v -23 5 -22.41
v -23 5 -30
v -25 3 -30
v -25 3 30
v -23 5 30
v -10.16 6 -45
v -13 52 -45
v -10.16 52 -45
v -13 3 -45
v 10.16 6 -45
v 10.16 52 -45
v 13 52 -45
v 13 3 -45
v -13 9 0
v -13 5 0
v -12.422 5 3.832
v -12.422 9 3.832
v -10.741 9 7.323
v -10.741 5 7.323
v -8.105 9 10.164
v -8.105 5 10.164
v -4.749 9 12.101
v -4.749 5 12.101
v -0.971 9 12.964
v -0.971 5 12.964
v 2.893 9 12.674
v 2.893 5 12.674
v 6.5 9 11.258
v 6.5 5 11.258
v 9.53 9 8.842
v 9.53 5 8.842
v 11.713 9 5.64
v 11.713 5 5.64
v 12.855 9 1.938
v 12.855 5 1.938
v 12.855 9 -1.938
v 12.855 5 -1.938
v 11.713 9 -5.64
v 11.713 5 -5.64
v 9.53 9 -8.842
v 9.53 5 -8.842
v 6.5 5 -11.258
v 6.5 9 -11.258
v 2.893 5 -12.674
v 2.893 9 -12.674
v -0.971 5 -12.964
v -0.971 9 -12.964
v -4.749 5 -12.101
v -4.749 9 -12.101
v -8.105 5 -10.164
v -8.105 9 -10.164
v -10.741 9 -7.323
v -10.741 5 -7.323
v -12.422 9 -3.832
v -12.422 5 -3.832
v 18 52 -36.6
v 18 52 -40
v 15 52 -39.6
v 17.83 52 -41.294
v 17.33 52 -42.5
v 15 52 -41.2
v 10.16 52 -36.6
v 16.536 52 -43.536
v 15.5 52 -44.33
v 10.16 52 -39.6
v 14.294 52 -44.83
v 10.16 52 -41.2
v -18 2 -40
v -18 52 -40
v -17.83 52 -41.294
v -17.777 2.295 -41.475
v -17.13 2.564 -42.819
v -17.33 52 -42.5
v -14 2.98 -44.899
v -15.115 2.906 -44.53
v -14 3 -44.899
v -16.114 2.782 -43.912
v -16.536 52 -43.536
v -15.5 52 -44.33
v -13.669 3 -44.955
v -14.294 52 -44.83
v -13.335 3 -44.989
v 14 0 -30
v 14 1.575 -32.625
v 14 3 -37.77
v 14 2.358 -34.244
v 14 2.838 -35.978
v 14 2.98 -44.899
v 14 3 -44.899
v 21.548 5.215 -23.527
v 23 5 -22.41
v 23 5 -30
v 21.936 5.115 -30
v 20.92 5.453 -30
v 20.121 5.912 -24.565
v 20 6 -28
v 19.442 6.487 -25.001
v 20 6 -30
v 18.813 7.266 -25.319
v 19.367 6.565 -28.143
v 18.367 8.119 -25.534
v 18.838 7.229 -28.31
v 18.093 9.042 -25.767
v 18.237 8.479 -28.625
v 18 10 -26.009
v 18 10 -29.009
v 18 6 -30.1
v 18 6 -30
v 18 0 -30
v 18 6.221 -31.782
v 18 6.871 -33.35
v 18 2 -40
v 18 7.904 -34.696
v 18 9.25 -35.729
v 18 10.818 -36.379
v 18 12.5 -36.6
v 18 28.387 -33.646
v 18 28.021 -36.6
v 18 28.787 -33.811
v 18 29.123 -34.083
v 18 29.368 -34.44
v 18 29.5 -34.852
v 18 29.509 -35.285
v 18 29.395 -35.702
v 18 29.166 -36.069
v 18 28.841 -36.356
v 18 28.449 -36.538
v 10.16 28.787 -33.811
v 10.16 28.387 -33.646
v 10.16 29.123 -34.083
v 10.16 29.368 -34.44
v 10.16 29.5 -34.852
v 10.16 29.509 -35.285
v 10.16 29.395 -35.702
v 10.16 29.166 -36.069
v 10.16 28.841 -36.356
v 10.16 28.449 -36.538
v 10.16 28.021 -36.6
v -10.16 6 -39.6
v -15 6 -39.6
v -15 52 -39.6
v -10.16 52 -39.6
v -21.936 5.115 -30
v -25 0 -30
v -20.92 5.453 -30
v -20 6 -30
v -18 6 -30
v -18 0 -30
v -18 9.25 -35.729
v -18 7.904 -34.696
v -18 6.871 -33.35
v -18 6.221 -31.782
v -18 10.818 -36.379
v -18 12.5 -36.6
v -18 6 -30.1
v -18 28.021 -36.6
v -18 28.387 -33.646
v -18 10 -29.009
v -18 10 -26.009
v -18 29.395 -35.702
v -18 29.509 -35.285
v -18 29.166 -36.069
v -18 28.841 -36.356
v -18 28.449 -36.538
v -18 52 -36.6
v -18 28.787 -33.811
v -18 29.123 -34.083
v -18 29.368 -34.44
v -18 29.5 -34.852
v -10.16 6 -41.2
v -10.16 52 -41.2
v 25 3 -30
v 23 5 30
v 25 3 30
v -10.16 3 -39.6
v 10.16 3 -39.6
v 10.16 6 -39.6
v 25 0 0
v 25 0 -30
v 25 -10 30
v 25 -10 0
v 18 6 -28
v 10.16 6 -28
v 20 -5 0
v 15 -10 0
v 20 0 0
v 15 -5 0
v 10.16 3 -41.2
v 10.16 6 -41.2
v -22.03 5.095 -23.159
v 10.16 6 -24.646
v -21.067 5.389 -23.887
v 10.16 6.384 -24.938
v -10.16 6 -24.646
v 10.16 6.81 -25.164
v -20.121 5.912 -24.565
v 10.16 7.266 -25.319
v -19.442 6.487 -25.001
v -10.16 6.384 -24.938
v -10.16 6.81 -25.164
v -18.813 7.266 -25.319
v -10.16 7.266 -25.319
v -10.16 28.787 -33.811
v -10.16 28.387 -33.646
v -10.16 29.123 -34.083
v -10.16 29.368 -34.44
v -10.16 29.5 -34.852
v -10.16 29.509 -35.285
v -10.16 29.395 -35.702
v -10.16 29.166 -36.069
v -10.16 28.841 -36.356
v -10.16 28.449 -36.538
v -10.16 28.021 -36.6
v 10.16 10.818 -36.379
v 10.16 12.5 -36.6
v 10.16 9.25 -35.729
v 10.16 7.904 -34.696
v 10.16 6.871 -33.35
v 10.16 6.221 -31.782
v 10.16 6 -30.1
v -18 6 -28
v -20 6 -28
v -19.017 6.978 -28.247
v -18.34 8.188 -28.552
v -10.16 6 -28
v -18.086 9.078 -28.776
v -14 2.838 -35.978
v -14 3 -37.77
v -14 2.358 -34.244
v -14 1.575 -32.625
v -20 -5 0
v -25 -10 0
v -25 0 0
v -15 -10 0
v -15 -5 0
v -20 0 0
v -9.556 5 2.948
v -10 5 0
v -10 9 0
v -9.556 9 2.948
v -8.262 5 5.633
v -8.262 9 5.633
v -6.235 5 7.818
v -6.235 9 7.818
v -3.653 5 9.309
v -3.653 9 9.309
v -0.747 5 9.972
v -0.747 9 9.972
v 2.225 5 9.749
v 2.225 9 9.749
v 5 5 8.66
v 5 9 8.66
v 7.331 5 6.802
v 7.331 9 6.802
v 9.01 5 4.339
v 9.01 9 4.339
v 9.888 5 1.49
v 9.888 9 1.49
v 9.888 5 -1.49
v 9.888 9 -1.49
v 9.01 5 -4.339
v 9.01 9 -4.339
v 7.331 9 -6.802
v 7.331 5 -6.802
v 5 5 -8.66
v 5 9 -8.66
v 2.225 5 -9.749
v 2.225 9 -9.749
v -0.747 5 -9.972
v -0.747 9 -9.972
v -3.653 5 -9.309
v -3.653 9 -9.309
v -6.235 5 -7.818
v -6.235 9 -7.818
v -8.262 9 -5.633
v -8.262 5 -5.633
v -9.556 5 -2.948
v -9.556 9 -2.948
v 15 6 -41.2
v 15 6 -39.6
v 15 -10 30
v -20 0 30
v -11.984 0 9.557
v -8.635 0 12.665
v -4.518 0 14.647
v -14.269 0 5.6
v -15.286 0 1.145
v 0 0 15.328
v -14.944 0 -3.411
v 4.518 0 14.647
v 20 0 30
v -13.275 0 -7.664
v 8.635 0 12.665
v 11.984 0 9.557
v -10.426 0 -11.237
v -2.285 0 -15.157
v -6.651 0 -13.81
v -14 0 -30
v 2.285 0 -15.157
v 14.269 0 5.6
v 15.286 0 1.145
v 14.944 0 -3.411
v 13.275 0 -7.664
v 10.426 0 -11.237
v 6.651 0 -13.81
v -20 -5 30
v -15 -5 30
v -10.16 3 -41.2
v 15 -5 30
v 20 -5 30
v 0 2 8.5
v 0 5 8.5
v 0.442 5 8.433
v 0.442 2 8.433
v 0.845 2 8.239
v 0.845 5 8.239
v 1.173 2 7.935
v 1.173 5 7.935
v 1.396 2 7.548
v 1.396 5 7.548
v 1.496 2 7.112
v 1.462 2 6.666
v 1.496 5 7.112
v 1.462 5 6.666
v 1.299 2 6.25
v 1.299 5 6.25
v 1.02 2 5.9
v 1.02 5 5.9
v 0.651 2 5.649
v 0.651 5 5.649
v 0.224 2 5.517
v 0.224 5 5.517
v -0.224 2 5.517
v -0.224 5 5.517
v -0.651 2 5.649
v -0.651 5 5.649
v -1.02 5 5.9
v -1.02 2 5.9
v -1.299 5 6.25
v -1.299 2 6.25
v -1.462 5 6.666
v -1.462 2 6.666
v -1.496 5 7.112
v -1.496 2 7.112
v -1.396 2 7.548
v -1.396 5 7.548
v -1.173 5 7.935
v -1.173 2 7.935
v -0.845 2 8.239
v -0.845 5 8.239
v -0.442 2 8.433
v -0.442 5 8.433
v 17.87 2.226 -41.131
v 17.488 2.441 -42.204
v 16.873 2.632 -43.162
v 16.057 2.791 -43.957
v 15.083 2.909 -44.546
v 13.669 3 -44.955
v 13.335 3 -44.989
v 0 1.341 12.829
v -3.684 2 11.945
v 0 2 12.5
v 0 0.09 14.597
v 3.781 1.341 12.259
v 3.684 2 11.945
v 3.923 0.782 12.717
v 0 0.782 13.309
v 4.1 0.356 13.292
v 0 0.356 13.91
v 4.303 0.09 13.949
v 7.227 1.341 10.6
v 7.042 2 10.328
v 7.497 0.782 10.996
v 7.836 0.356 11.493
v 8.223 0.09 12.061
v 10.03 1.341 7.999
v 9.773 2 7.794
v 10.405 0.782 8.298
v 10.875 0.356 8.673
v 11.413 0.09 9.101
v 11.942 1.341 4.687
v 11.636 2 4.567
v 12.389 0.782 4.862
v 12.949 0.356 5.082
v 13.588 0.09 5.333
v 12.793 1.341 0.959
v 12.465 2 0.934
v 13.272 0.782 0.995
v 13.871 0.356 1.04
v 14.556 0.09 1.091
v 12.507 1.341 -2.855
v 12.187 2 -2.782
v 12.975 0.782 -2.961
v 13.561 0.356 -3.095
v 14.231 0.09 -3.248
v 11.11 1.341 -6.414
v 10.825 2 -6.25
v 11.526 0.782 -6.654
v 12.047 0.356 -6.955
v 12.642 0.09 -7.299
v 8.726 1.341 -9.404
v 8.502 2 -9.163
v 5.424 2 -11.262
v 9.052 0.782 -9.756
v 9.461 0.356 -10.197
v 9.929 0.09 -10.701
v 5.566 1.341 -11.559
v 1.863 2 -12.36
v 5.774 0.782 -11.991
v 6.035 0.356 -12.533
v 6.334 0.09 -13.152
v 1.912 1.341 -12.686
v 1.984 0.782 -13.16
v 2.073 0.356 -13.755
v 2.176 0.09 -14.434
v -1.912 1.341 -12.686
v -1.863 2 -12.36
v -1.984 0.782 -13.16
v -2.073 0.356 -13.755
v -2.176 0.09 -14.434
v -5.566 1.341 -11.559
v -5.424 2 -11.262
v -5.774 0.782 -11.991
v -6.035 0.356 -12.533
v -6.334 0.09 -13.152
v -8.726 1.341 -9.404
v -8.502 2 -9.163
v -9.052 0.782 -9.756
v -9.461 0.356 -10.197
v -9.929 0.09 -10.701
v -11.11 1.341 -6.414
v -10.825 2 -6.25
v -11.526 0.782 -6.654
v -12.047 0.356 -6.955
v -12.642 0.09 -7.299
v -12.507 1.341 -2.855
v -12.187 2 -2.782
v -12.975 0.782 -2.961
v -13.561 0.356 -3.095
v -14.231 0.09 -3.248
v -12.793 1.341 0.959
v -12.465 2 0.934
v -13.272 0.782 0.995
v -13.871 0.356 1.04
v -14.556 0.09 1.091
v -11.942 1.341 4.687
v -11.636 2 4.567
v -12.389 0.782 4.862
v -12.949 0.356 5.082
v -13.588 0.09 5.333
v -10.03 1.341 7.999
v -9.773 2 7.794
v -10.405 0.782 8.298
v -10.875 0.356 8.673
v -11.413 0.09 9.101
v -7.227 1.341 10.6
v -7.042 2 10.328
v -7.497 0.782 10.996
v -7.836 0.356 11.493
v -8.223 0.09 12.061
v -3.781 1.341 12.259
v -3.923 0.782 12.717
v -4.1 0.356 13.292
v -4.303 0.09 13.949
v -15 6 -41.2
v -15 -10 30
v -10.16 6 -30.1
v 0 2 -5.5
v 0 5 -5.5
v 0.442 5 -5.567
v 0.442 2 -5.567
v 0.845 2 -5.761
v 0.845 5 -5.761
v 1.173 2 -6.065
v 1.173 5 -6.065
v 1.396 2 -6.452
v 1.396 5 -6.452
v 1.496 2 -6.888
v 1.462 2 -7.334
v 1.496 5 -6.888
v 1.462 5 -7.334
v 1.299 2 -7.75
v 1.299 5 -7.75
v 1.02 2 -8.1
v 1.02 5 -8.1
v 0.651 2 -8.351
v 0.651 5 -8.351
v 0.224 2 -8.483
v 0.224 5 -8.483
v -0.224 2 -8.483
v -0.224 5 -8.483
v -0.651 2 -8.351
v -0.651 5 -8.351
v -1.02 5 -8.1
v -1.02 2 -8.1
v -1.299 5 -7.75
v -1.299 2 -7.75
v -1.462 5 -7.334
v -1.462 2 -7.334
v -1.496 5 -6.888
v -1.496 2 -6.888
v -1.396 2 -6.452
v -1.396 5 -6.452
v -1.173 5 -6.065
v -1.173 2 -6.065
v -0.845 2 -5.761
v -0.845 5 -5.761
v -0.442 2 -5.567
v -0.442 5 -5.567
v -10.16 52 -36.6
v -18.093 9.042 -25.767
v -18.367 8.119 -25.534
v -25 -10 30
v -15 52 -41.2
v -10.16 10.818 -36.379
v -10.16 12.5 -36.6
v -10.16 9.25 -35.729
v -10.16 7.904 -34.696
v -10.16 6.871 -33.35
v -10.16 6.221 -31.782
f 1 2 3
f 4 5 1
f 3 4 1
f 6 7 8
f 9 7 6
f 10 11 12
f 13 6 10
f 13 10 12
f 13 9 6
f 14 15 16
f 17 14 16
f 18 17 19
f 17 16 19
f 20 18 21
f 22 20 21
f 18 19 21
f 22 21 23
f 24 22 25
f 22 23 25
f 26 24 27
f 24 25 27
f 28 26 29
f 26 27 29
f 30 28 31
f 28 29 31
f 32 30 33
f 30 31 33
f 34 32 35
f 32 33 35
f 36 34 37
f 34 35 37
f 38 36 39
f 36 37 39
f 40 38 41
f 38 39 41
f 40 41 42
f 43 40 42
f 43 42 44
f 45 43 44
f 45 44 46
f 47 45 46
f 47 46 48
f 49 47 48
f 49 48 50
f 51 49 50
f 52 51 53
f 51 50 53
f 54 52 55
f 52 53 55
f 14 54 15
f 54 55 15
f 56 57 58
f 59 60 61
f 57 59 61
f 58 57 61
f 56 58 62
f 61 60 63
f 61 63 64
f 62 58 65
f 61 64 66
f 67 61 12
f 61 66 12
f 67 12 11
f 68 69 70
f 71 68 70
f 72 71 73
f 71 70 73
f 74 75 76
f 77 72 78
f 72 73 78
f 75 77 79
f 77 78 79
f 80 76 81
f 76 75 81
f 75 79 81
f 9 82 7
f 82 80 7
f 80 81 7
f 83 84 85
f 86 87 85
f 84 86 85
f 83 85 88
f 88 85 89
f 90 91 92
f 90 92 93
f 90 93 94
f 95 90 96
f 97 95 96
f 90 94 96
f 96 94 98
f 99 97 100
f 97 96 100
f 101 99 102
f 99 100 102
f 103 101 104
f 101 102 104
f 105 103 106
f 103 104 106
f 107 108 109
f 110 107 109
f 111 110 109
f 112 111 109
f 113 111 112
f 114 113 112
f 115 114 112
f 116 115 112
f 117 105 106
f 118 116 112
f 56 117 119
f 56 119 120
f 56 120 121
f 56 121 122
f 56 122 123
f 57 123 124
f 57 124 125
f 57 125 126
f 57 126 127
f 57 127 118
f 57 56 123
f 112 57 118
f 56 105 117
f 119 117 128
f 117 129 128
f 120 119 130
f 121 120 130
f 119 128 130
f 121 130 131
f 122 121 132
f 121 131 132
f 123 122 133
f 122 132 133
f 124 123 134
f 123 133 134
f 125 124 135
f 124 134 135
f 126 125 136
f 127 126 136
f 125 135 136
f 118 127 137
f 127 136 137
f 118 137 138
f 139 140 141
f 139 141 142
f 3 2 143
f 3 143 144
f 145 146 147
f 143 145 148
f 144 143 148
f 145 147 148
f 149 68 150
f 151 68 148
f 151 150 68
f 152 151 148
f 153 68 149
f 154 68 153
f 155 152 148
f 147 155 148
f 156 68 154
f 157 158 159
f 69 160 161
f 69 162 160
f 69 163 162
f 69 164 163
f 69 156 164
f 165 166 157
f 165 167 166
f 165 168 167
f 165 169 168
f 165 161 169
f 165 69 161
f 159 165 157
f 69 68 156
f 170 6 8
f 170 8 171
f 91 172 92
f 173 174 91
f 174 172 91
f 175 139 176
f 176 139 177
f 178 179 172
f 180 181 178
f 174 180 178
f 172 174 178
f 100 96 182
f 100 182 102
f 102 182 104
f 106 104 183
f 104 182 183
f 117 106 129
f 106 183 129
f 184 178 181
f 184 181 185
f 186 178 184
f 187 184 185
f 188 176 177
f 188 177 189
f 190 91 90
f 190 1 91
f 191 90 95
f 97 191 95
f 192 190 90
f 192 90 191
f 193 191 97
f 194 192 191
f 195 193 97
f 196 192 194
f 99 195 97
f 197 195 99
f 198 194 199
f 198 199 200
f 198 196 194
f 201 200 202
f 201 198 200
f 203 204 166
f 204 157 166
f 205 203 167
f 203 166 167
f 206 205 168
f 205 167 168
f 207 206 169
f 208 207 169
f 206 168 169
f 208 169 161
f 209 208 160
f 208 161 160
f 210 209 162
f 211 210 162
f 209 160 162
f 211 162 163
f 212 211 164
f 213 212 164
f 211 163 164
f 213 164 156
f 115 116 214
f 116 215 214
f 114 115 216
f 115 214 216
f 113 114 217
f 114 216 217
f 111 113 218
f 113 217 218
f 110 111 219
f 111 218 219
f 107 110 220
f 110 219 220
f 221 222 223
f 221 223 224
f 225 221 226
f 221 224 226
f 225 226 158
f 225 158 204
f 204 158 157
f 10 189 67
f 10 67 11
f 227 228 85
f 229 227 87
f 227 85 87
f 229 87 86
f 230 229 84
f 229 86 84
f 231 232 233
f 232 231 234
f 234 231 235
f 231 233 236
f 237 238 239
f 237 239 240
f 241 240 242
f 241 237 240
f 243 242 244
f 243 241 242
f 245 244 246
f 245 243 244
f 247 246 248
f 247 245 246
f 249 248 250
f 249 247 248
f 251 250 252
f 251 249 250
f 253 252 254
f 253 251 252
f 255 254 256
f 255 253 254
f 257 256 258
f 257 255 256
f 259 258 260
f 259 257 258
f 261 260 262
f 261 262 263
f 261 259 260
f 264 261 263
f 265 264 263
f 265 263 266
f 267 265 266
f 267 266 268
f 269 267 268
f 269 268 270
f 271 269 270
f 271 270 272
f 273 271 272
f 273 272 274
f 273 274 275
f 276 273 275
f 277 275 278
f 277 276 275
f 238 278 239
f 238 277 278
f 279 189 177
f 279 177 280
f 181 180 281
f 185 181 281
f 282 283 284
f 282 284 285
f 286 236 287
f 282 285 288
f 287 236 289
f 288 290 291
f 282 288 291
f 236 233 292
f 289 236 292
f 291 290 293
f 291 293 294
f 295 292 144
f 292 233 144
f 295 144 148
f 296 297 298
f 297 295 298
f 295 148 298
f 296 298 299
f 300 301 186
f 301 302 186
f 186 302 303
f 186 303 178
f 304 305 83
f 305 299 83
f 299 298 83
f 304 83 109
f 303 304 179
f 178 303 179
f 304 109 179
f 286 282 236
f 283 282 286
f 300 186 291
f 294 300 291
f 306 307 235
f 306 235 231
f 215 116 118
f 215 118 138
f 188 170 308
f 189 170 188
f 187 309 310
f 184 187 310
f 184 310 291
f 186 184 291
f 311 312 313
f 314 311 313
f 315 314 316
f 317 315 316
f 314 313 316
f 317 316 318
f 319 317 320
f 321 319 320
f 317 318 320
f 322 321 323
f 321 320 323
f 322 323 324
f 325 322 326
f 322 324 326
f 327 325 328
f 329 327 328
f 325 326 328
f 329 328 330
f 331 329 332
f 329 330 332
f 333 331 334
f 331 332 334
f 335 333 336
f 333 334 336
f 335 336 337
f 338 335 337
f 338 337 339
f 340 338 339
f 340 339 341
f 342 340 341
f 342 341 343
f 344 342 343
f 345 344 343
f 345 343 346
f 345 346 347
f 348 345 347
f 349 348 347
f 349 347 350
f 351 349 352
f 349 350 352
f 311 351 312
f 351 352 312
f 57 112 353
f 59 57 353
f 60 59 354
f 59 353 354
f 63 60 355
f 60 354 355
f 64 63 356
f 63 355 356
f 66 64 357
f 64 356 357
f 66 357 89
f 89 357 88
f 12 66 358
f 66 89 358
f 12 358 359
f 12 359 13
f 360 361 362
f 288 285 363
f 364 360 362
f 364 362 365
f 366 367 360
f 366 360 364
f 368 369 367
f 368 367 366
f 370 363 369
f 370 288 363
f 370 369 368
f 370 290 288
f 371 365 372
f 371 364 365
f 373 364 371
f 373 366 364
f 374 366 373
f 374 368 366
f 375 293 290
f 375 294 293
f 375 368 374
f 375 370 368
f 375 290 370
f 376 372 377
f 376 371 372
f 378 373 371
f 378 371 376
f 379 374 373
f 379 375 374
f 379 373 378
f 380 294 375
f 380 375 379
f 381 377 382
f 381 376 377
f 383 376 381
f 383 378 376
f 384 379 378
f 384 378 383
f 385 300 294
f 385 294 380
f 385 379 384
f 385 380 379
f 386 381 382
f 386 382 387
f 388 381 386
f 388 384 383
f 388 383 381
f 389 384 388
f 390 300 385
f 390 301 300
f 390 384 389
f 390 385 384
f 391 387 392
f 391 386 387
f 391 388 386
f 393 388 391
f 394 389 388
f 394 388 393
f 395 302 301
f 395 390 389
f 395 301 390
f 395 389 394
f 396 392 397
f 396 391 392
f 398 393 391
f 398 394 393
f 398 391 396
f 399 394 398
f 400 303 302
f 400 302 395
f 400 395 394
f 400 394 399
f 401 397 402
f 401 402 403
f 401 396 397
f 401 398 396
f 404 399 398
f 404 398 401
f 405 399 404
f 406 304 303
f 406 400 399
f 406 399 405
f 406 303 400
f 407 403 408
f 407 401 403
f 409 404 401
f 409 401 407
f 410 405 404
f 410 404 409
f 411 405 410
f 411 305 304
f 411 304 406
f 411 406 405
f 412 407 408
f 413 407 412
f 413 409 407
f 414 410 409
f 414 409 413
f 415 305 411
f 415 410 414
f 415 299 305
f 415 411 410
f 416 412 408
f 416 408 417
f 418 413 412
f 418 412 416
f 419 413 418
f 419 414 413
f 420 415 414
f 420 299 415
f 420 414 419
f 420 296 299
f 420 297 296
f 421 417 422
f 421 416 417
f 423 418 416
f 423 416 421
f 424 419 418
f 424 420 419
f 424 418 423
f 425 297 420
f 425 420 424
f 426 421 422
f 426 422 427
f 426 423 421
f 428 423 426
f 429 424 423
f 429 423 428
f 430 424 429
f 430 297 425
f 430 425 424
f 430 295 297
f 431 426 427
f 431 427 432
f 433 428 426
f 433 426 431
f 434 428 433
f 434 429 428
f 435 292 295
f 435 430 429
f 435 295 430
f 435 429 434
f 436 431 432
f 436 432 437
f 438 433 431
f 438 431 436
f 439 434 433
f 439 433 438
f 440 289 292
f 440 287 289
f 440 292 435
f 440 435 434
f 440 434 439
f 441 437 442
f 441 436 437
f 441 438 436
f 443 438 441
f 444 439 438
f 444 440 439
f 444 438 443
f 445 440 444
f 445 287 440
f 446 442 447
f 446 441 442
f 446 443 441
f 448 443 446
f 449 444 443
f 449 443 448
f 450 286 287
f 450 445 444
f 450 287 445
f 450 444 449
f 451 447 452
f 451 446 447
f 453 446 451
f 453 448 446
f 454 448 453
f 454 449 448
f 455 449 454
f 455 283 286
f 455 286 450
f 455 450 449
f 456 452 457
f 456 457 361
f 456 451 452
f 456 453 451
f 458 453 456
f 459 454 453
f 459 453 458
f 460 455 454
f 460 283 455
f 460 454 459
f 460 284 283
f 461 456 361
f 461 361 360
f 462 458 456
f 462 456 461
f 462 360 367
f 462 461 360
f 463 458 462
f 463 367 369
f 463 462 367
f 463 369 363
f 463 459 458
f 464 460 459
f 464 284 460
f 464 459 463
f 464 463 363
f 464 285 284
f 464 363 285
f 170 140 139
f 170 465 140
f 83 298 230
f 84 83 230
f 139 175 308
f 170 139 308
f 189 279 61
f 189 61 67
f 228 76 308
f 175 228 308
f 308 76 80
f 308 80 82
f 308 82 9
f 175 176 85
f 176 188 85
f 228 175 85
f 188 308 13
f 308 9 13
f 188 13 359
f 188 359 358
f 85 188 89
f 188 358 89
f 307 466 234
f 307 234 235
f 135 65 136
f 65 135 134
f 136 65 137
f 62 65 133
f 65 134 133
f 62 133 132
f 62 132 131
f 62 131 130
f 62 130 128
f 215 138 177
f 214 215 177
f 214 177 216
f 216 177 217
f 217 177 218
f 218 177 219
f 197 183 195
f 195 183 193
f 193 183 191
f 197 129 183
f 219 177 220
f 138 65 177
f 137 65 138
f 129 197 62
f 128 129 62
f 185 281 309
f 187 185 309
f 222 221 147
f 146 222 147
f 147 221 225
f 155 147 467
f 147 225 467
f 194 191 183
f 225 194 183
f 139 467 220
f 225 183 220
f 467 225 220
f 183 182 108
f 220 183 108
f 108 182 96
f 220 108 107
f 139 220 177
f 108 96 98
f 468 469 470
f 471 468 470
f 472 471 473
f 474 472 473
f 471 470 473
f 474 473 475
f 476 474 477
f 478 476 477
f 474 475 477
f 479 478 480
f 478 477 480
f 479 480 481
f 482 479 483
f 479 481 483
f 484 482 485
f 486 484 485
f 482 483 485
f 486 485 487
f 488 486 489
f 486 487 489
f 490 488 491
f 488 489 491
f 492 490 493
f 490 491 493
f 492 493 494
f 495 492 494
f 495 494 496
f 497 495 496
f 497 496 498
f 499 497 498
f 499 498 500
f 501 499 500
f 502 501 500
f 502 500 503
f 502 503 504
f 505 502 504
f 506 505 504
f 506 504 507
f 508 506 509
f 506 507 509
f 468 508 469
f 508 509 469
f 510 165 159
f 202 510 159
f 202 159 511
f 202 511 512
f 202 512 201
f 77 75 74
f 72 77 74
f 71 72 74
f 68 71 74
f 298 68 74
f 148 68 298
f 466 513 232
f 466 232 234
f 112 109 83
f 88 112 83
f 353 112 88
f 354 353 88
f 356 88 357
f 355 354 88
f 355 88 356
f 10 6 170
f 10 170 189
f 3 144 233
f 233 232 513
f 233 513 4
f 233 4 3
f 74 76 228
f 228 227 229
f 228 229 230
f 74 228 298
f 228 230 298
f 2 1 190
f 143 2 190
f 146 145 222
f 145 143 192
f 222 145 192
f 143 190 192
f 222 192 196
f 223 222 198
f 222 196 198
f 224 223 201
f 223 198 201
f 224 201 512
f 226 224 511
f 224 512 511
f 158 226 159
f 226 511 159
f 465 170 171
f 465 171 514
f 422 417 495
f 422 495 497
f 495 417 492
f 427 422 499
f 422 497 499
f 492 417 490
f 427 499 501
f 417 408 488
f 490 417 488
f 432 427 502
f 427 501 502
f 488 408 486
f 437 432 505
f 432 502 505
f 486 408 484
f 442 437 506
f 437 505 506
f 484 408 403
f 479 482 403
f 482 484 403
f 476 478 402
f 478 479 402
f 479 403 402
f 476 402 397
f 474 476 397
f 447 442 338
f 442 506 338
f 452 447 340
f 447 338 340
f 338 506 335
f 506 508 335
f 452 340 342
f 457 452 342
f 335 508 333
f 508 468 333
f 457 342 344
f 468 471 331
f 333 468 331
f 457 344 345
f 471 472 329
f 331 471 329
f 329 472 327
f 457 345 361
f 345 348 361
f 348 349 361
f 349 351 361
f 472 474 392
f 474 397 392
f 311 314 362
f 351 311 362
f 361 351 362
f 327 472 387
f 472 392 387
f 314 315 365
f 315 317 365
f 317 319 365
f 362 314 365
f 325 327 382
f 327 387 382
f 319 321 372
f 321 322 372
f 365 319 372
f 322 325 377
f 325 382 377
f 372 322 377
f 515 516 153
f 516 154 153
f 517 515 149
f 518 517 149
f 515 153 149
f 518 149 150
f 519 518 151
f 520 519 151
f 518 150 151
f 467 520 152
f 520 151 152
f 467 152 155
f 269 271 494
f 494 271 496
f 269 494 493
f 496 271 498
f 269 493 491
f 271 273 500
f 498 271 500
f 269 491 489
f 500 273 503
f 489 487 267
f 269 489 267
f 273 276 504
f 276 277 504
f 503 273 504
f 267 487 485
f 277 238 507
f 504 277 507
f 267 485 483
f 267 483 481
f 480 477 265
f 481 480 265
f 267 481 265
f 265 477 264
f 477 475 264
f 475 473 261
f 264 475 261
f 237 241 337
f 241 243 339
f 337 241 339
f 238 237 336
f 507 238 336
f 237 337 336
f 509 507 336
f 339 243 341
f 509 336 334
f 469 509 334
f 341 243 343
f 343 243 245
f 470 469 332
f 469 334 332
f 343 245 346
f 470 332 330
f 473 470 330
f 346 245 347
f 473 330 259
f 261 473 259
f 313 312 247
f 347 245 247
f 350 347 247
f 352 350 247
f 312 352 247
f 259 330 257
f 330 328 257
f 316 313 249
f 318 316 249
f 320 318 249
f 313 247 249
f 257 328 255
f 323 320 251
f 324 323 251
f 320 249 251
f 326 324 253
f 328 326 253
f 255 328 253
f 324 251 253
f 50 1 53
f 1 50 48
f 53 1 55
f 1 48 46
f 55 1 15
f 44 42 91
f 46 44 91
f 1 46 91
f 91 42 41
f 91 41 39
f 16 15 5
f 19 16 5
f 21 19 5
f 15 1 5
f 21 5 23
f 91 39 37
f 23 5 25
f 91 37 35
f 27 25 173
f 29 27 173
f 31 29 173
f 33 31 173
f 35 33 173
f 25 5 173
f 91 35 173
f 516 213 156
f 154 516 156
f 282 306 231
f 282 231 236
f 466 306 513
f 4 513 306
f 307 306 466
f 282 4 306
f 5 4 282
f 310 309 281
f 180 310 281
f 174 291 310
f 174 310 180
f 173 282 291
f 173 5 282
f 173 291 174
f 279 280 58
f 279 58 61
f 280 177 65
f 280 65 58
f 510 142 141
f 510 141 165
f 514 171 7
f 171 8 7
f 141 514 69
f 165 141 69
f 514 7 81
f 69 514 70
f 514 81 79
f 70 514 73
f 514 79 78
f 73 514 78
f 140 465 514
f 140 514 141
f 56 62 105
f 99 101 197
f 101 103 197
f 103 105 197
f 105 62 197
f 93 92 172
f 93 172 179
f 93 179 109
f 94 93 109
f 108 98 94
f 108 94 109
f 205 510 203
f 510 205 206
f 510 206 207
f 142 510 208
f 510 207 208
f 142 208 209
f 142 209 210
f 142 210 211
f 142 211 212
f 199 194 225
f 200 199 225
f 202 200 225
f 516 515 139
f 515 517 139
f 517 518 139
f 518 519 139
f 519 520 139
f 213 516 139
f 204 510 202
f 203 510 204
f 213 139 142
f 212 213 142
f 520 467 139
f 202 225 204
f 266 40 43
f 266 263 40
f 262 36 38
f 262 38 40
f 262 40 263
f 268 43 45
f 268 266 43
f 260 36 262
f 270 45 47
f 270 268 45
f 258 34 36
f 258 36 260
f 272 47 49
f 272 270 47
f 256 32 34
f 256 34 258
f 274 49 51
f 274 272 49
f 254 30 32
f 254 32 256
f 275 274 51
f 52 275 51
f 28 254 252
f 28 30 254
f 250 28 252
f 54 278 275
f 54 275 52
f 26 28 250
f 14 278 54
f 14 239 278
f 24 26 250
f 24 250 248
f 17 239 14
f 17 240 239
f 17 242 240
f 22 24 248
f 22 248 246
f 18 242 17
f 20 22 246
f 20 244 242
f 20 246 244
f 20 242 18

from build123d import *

# Parameters (mm, degrees)
SKETCH_2_W          = 60
SKETCH_2_H          = 60
EXTRUDE_1_DEPTH     = 3
EXTRUDE_START       = 30
EXTRUDE_3_DEPTH     = 30
EXTRUDE_START_2     = 3
SKETCH_8_W          = 36
SKETCH_8_H          = 20
EXTRUDE_4_DEPTH     = 3
CUT_EXTRUDE_START   = 6
SKETCH_10_W         = 20.32
SKETCH_10_H         = 1.6
CUT_EXTRUDE_2_DEPTH = 3
EXTRUDE_START_3     = 6
EXTRUDE_5_DEPTH     = 46
EXTRUDE_START_4     = -18
EXTRUDE_6_DEPTH     = 36
EXTRUDE_START_5     = 18
EXTRUDE_8_DEPTH     = 7.84
EXTRUDE_START_6     = -10.16
EXTRUDE_9_DEPTH     = 7.84
EXTRUDE_10_DEPTH    = 36
SKETCH_16_W         = 5
SKETCH_16_H         = 60
CUT_EXTRUDE_3_DEPTH = 3
EXTRUDE_11_DEPTH    = 4
EXTRUDE_12_DEPTH    = 4
FILLET_3_R          = 5
FILLET_4_R          = 10
SKETCH_22_W         = 50
SKETCH_22_H         = 2
EXTRUDE_14_DEPTH    = 60
CUT_EXTRUDE_START_2 = 30
CUT_EXTRUDE_4_DEPTH = 60
SKETCH_26_R         = 12.5
CUT_EXTRUDE_6_DEPTH = 2
FILLET_5_R          = 3
FILLET_7_R          = 5
FILLET_8_R          = 6.5
FILLET_9_R          = 1.5
FILLET_10_R         = 3
CUT_EXTRUDE_START_3 = 5
SKETCH_27_R         = 1.5
CUT_EXTRUDE_7_DEPTH = 3
EXTRUDE_START_7     = 5
SKETCH_28_R         = 13
SKETCH_28_R_2       = 10
EXTRUDE_15_DEPTH    = 4


with BuildPart() as part:
    # 草图2 → 凸台-拉伸1 (new body)
    with BuildSketch(Plane(origin=(0, 0, 0), x_dir=(1, 0, 0), z_dir=(0, 1, 0))):
        Rectangle(SKETCH_2_W, SKETCH_2_H)
    extrude(amount=EXTRUDE_1_DEPTH)

    # 草图7 → 凸台-拉伸3 (add)
    with BuildSketch(Plane.XY.offset(EXTRUDE_START)):
        Polygon((-25, 0), (-25, -10), (-15, -10), (-15, -5), (-20, -5), (-20, 0), align=None)
        Polygon((20, 0), (25, 0), (25, -10), (15, -10), (15, -5), (20, -5), align=None)
    extrude(amount=-EXTRUDE_3_DEPTH)

    # 草图8 → 凸台-拉伸4 (add)
    with BuildSketch(Plane(origin=(0, 0, 0), x_dir=(1, 0, 0), z_dir=(0, 1, 0)).offset(EXTRUDE_START_2)):
        with Locations((0, 35)):
            Rectangle(SKETCH_8_W, SKETCH_8_H)
    extrude(amount=EXTRUDE_4_DEPTH)

    # 草图10 → 切除-拉伸2 (cut)
    with BuildSketch(Plane(origin=(0, 0, 0), x_dir=(1, 0, 0), z_dir=(0, 1, 0)).offset(CUT_EXTRUDE_START)):
        with Locations((0, 40.4)):
            Rectangle(SKETCH_10_W, SKETCH_10_H)
    extrude(amount=-CUT_EXTRUDE_2_DEPTH, mode=Mode.SUBTRACT)

    # 草图11 → 凸台-拉伸5 (add)
    with BuildSketch(Plane(origin=(0, 0, 0), x_dir=(1, 0, 0), z_dir=(0, 1, 0)).offset(EXTRUDE_START_3)):
        Polygon((10.16, 41.2), (10.16, 45), (18, 45), (18, 36.6), (10.16, 36.6), (10.16, 39.6), (15, 39.6), (15, 41.2), align=None)
        Polygon((-15, 41.2), (-15, 39.6), (-10.16, 39.6), (-10.16, 36.6), (-18, 36.6), (-18, 45), (-10.16, 45), (-10.16, 41.2), align=None)
    extrude(amount=EXTRUDE_5_DEPTH)

    # 草图12 → 凸台-拉伸6 (add)
    with BuildSketch(Plane(origin=(0, 0, 0), x_dir=(0, 0, -1), z_dir=(1, 0, 0)).offset(EXTRUDE_START_4)):
        Polygon((30, 0), (35, 3), (30, 3), align=None)
    extrude(amount=EXTRUDE_6_DEPTH)

    # 草图13 → 凸台-拉伸8 (add)
    with BuildSketch(Plane(origin=(0, 0, 0), x_dir=(0, 0, -1), z_dir=(1, 0, 0)).offset(EXTRUDE_START_5)):
        Polygon((25, 6), (36.6, 52), (36.6, 40.103448276), (28, 6), align=None)
    extrude(amount=-EXTRUDE_8_DEPTH)

    # 草图14 → 凸台-拉伸9 (add)
    with BuildSketch(Plane(origin=(0, 0, 0), x_dir=(0, 0, -1), z_dir=(1, 0, 0)).offset(EXTRUDE_START_6)):
        Polygon((36.6, 52), (25, 6), (28, 6), (36.6, 40.103448276), align=None)
    extrude(amount=-EXTRUDE_9_DEPTH)

    # 草图15 → 凸台-拉伸10 (add)
    with BuildSketch(Plane(origin=(0, 0, 0), x_dir=(0, 0, -1), z_dir=(1, 0, 0)).offset(EXTRUDE_START_4)):
        Polygon((25, 3), (24.243478261, 3), (25, 6), align=None)
    extrude(amount=EXTRUDE_10_DEPTH)

    # 草图16 → 切除-拉伸3 (cut)
    with BuildSketch(Plane(origin=(0, 0, 0), x_dir=(1, 0, 0), z_dir=(0, 1, 0))):
        with Locations((27.5, 0)):
            Rectangle(SKETCH_16_W, SKETCH_16_H)
        with Locations((-27.5, 0)):
            Rectangle(SKETCH_16_W, SKETCH_16_H)
    extrude(amount=CUT_EXTRUDE_3_DEPTH, mode=Mode.SUBTRACT)

    # 草图17 → 凸台-拉伸11 (add)
    with BuildSketch(Plane(origin=(0, 0, 0), x_dir=(0, 0, -1), z_dir=(1, 0, 0)).offset(EXTRUDE_START_5)):
        Polygon((30, 0), (45, 3), (30, 3), align=None)
    extrude(amount=-EXTRUDE_11_DEPTH)

    # 草图18 → 凸台-拉伸12 (add)
    with BuildSketch(Plane(origin=(0, 0, 0), x_dir=(0, 0, -1), z_dir=(1, 0, 0)).offset(EXTRUDE_START_4)):
        Polygon((30, 0), (30, 3), (45, 3), align=None)
    extrude(amount=EXTRUDE_12_DEPTH)

    # 圆角3
    # the kernel refuses this fillet: 5 mm, written as the material it takes off along each edge
    with BuildSketch(Plane(origin=(18, -9.5, -45), x_dir=(0, 0, 1), z_dir=(0, 1, 0)), Plane(origin=(-18, 64.5, -45), x_dir=(0, 0, 1), z_dir=(0, -1, 0))) as fillet_3_piece_1:
        with BuildLine():
            CenterArc((FILLET_3_R, -FILLET_3_R), FILLET_3_R, 90, 90)
            Line((0, -FILLET_3_R), (0, 0))
            Line((0, 0), (FILLET_3_R, 0))
        make_face()
    extrude(amount=74, mode=Mode.SUBTRACT)

    # 圆角4
    fillet_4_edges = [part.edges().sort_by_distance(p)[0] for p in [
        (0, 3, -35),
    ]]
    fillet(fillet_4_edges, radius=FILLET_4_R)

    # 草图22 → 凸台-拉伸14 (add)
    with BuildSketch(Plane.XY.offset(EXTRUDE_START)):
        with Locations((0, 4)):
            Rectangle(SKETCH_22_W, SKETCH_22_H)
    extrude(amount=-EXTRUDE_14_DEPTH)

    # 草图24 → 切除-拉伸4 (cut)
    with BuildSketch(Plane.XY.offset(CUT_EXTRUDE_START_2)):
        Polygon((-25, 5), (-23, 5), (-25, 3), align=None)
        Polygon((25, 5), (25, 3), (23, 5), align=None)
    extrude(amount=-CUT_EXTRUDE_4_DEPTH, mode=Mode.SUBTRACT)

    # 草图26 → 切除-拉伸6 (cut)
    with BuildSketch(Plane(origin=(0, 0, 0), x_dir=(1, 0, 0), z_dir=(0, 1, 0))):
        with Locations(Location((0, 0, 0), (0, 0, 270))):
            Circle(SKETCH_26_R)
    extrude(amount=CUT_EXTRUDE_6_DEPTH, mode=Mode.SUBTRACT)

    # 圆角5
    # the kernel refuses this fillet: 3 mm, written as the material it takes off along each edge
    with BuildSketch(Plane(origin=(0, 0, 0), x_dir=(0, 0, 1), z_dir=(-1, 0, 0))) as fillet_5_piece_1:
        with BuildLine():
            CenterArc((15.328427125, 3), FILLET_5_R, 199.471220634, 70.528779366)
            Line((12.5, 2), (12.443431458, 1.98))
            ThreePointArc((12.443431458, 1.98), (12.44, 1), (12.44, 0))
            Line((12.44, 0), (12.5, -0.06))
            Line((12.5, -0.06), (15.328427125, -0.06))
            Line((15.328427125, -0.06), (15.328427125, 0))
        make_face()
    revolve(axis=Axis((0, 0, 0), (0, 1, 0)), mode=Mode.SUBTRACT)

    # 圆角7
    # the kernel refuses this fillet: 5 mm, written as the material it adds along each edge
    with BuildSketch(Plane(origin=(-18, 5, -12.247826087), x_dir=(0, 1, 0), z_dir=(0, 0, -1))) as fillet_7_piece_1_section:
        with BuildLine():
            CenterArc((FILLET_7_R, -FILLET_7_R), FILLET_7_R, 90, 90)
            Line((0, -FILLET_7_R), (0, 0))
            Line((0, 0), (FILLET_7_R, 0))
        make_face()
    fillet_7_piece_1 = extrude(amount=30.252173913, mode=Mode.PRIVATE)
    fillet_7_piece_1 = split(fillet_7_piece_1, bisect_by=Plane(origin=(-18.571810287, 7.311264389, -25.330666672), z_dir=(0, -0.24451904524274018, -0.9696444897556934)), keep=Keep.TOP, mode=Mode.PRIVATE)
    fillet_7_piece_1 = split(fillet_7_piece_1, bisect_by=Plane(origin=(-18.571810287, 6.599974755, -28.151297982), z_dir=(0, 0.24451904524274015, 0.9696444897556934)), keep=Keep.TOP, mode=Mode.PRIVATE)
    add(fillet_7_piece_1)
    with BuildSketch(Plane(origin=(-18, 5, -12.247826087), x_dir=(0, 1, 0), z_dir=(0, 0, -1))) as fillet_7_piece_2_section:
        with BuildLine():
            CenterArc((FILLET_7_R, -FILLET_7_R), FILLET_7_R, 90, 90)
            Line((0, -FILLET_7_R), (0, 0))
            Line((0, 0), (FILLET_7_R, 0))
        make_face()
    fillet_7_piece_2 = extrude(amount=17.752173913, mode=Mode.PRIVATE)
    fillet_7_piece_2 = split(fillet_7_piece_2, bisect_by=Plane(origin=(-19.572975188, 6, -28.927333211), z_dir=(0, -1, 0)), keep=Keep.TOP, mode=Mode.PRIVATE)
    fillet_7_piece_2 = split(fillet_7_piece_2, bisect_by=Plane(origin=(-19.572975188, 5.678002788, -27.918800703), z_dir=(0, -0.24451904524274015, -0.9696444897556934)), keep=Keep.TOP, mode=Mode.PRIVATE)
    add(fillet_7_piece_2)
    with BuildSketch(Plane(origin=(18, 5, -30), x_dir=(1, 0, 0), z_dir=(0, 0, 1))) as fillet_7_piece_3_section:
        with BuildLine():
            CenterArc((FILLET_7_R, FILLET_7_R), FILLET_7_R, 180, 90)
            Line((0, FILLET_7_R), (0, 0))
            Line((0, 0), (FILLET_7_R, 0))
        make_face()
    fillet_7_piece_3 = extrude(amount=17.752173913, mode=Mode.PRIVATE)
    fillet_7_piece_3 = split(fillet_7_piece_3, bisect_by=Plane(origin=(19.572975189, 6, -28.92733321), z_dir=(0, -1, 0)), keep=Keep.TOP, mode=Mode.PRIVATE)
    fillet_7_piece_3 = split(fillet_7_piece_3, bisect_by=Plane(origin=(19.572975189, 6.389292423, -25.098169394), z_dir=(0, -0.24451904524274018, -0.9696444897556934)), keep=Keep.TOP, mode=Mode.PRIVATE)
    add(fillet_7_piece_3)
    with BuildSketch(Plane(origin=(18, 5, -42.5), x_dir=(1, 0, 0), z_dir=(0, 0, 1))) as fillet_7_piece_4_section:
        with BuildLine():
            CenterArc((FILLET_7_R, FILLET_7_R), FILLET_7_R, 180, 90)
            Line((0, FILLET_7_R), (0, 0))
            Line((0, 0), (FILLET_7_R, 0))
        make_face()
    fillet_7_piece_4 = extrude(amount=30.252173913, mode=Mode.PRIVATE)
    fillet_7_piece_4 = split(fillet_7_piece_4, bisect_by=Plane(origin=(18.571810287, 7.311264389, -25.330666672), z_dir=(0, -0.24451904524274018, -0.9696444897556934)), keep=Keep.TOP, mode=Mode.PRIVATE)
    fillet_7_piece_4 = split(fillet_7_piece_4, bisect_by=Plane(origin=(18.571810287, 6.599974754, -28.151297982), z_dir=(0, 0.24451904524274015, 0.9696444897556934)), keep=Keep.TOP, mode=Mode.PRIVATE)
    add(fillet_7_piece_4)

    # 圆角8
    fillet_8_edges = [part.edges().sort_by_distance(p)[0] for p in [
        (14.08, 6, -36.6),
        (-14.08, 6, -36.6),
    ]]
    fillet(fillet_8_edges, radius=FILLET_8_R)

    # 圆角9
    fillet_9_edges = [part.edges().sort_by_distance(p)[0] for p in [
        (14.08, 40.103448276, -36.6),
        (-14.08, 40.103448276, -36.6),
    ]]
    fillet(fillet_9_edges, radius=FILLET_9_R)

    # 圆角10
    # the kernel refuses this fillet: 3 mm, written as the material it adds along each edge
    with BuildSketch(Plane(origin=(-28.843489259, 5, -24.747826087), x_dir=(-2.8138525512499648e-15, 0.9696444897556498, -0.24451904524291254), z_dir=(1, 0, 0))) as fillet_10_piece_1_section:
        with BuildLine():
            CenterArc((FILLET_10_R * 0.779131901165, FILLET_10_R), FILLET_10_R, 194.153412588, 75.846587412)
            Line((-FILLET_10_R * 0.190512588591, FILLET_10_R * 0.755480954757), (0, 0))
            Line((0, 0), (FILLET_10_R * 0.779131901165, 0))
        make_face()
    fillet_10_piece_1 = extrude(amount=57.686978517, mode=Mode.PRIVATE)
    fillet_10_piece_1 = split(fillet_10_piece_1, bisect_by=Plane(origin=(-15.866529779, 6, -24.192724601), z_dir=(0, -1, 0)), keep=Keep.TOP, mode=Mode.PRIVATE)
    fillet_10_piece_1 = fillet_10_piece_1 - Plane(origin=(-23, 10, -24.192724601), x_dir=(0, 1, 0), z_dir=(0, 0, 1)) * Cylinder(5, 125, mode=Mode.PRIVATE)
    fillet_10_piece_1 = split(fillet_10_piece_1, bisect_by=Plane(origin=(-10.16, 5.299241574, -24.192724601), z_dir=(-1, 0, 0)), keep=Keep.TOP, mode=Mode.PRIVATE)
    fillet_10_piece_1 = split(fillet_10_piece_1, bisect_by=Plane(origin=(-19.283644102, 8.716355898, -24.192724601), z_dir=(0.7071067811865488, -0.7071067811865462, 0)), keep=Keep.TOP, mode=Mode.PRIVATE)
    add(fillet_10_piece_1)
    with BuildSketch(Plane(origin=(-28.843489259, 5, -24.747826087), x_dir=(-2.8138525512499648e-15, 0.9696444897556498, -0.24451904524291254), z_dir=(1, 0, 0))) as fillet_10_piece_2_section:
        with BuildLine():
            CenterArc((FILLET_10_R * 0.779131901165, FILLET_10_R), FILLET_10_R, 194.153412588, 75.846587412)
            Line((-FILLET_10_R * 0.190512588591, FILLET_10_R * 0.755480954757), (0, 0))
            Line((0, 0), (FILLET_10_R * 0.779131901165, 0))
        make_face()
    fillet_10_piece_2 = extrude(amount=57.686978517, mode=Mode.PRIVATE)
    fillet_10_piece_2 = split(fillet_10_piece_2, bisect_by=Plane(origin=(-14.854595225, 6, -25.046116775), z_dir=(0, 1, 0)), keep=Keep.TOP, mode=Mode.PRIVATE)
    fillet_10_piece_2 = fillet_10_piece_2 - Plane(origin=(-23, 10, -25.046116775), x_dir=(0, 1, 0), z_dir=(0, 0, 1)) * Cylinder(5, 125, mode=Mode.PRIVATE)
    fillet_10_piece_2 = split(fillet_10_piece_2, bisect_by=Plane(origin=(-10.16, 6.410540932, -25.046116775), z_dir=(-1, 0, 0)), keep=Keep.TOP, mode=Mode.PRIVATE)
    fillet_10_piece_2 = split(fillet_10_piece_2, bisect_by=Plane(origin=(-18.222027147, 9.777972853, -25.046116775), z_dir=(0.7071067811865488, -0.7071067811865462, 0)), keep=Keep.TOP, mode=Mode.PRIVATE)
    add(fillet_10_piece_2)
    with BuildSketch(Plane(origin=(-28.843489259, 5, -24.747826087), x_dir=(-2.8138525512499648e-15, 0.9696444897556498, -0.24451904524291254), z_dir=(1, 0, 0))) as fillet_10_piece_3_section:
        with BuildLine():
            CenterArc((FILLET_10_R * 0.779131901165, FILLET_10_R), FILLET_10_R, 194.153412588, 75.846587412)
            Line((-FILLET_10_R * 0.190512588591, FILLET_10_R * 0.755480954757), (0, 0))
            Line((0, 0), (FILLET_10_R * 0.779131901165, 0))
        make_face()
    fillet_10_piece_3 = extrude(amount=57.686978517, mode=Mode.PRIVATE)
    fillet_10_piece_3 = split(fillet_10_piece_3, bisect_by=Plane(origin=(0, 6, -24.222418931), z_dir=(0, -1, 0)), keep=Keep.TOP, mode=Mode.PRIVATE)
    fillet_10_piece_3 = split(fillet_10_piece_3, bisect_by=Plane(origin=(-10.16, 5.321349944, -24.222418931), z_dir=(1, 0, 0)), keep=Keep.TOP, mode=Mode.PRIVATE)
    fillet_10_piece_3 = split(fillet_10_piece_3, bisect_by=Plane(origin=(10.16, 5.321349944, -24.222418931), z_dir=(-1, 0, 0)), keep=Keep.TOP, mode=Mode.PRIVATE)
    add(fillet_10_piece_3)
    with BuildSketch(Plane(origin=(-28.843489259, 5, -24.747826087), x_dir=(-2.8138525512499648e-15, 0.9696444897556498, -0.24451904524291254), z_dir=(1, 0, 0))) as fillet_10_piece_4_section:
        with BuildLine():
            CenterArc((FILLET_10_R * 0.779131901165, FILLET_10_R), FILLET_10_R, 194.153412588, 75.846587412)
            Line((-FILLET_10_R * 0.190512588591, FILLET_10_R * 0.755480954757), (0, 0))
            Line((0, 0), (FILLET_10_R * 0.779131901165, 0))
        make_face()
    fillet_10_piece_4 = extrude(amount=57.686978517, mode=Mode.PRIVATE)
    fillet_10_piece_4 = split(fillet_10_piece_4, bisect_by=Plane(origin=(15.866529778, 6, -24.192724601), z_dir=(0, -1, 0)), keep=Keep.TOP, mode=Mode.PRIVATE)
    fillet_10_piece_4 = fillet_10_piece_4 - Plane(origin=(23, 10, -24.192724601), x_dir=(1, 0, 0), z_dir=(0, 0, -1)) * Cylinder(5, 125, mode=Mode.PRIVATE)
    fillet_10_piece_4 = split(fillet_10_piece_4, bisect_by=Plane(origin=(10.16, 5.299241574, -24.192724601), z_dir=(1, 0, 0)), keep=Keep.TOP, mode=Mode.PRIVATE)
    fillet_10_piece_4 = split(fillet_10_piece_4, bisect_by=Plane(origin=(19.283644102, 8.716355898, -24.192724601), z_dir=(-0.7071067811865306, -0.7071067811865644, 0)), keep=Keep.TOP, mode=Mode.PRIVATE)
    add(fillet_10_piece_4)
    with BuildSketch(Plane(origin=(-28.843489259, 5, -24.747826087), x_dir=(-2.8138525512499648e-15, 0.9696444897556498, -0.24451904524291254), z_dir=(1, 0, 0))) as fillet_10_piece_5_section:
        with BuildLine():
            CenterArc((FILLET_10_R * 0.779131901165, FILLET_10_R), FILLET_10_R, 194.153412588, 75.846587412)
            Line((-FILLET_10_R * 0.190512588591, FILLET_10_R * 0.755480954757), (0, 0))
            Line((0, 0), (FILLET_10_R * 0.779131901165, 0))
        make_face()
    fillet_10_piece_5 = extrude(amount=57.686978517, mode=Mode.PRIVATE)
    fillet_10_piece_5 = split(fillet_10_piece_5, bisect_by=Plane(origin=(14.854595225, 6, -25.046116775), z_dir=(0, 1, 0)), keep=Keep.TOP, mode=Mode.PRIVATE)
    fillet_10_piece_5 = fillet_10_piece_5 - Plane(origin=(23, 10, -25.046116775), x_dir=(1, 0, 0), z_dir=(0, 0, -1)) * Cylinder(5, 125, mode=Mode.PRIVATE)
    fillet_10_piece_5 = split(fillet_10_piece_5, bisect_by=Plane(origin=(10.16, 6.410540932, -25.046116775), z_dir=(1, 0, 0)), keep=Keep.TOP, mode=Mode.PRIVATE)
    fillet_10_piece_5 = split(fillet_10_piece_5, bisect_by=Plane(origin=(18.222027147, 9.777972853, -25.046116775), z_dir=(-0.7071067811865306, -0.7071067811865644, 0)), keep=Keep.TOP, mode=Mode.PRIVATE)
    add(fillet_10_piece_5)

    # 草图27 → 切除-拉伸7 (cut)
    with BuildSketch(Plane(origin=(0, 0, 0), x_dir=(1, 0, 0), z_dir=(0, 1, 0)).offset(CUT_EXTRUDE_START_3)):
        with Locations(Location((0, 7, 0), (0, 0, 270))):
            Circle(SKETCH_27_R)
        with Locations(Location((0, -7, 0), (0, 0, 270))):
            Circle(SKETCH_27_R)
    extrude(amount=-CUT_EXTRUDE_7_DEPTH, mode=Mode.SUBTRACT)

    # 草图28 → 凸台-拉伸15 (add)
    with BuildSketch(Plane(origin=(0, 0, 0), x_dir=(1, 0, 0), z_dir=(0, 1, 0)).offset(EXTRUDE_START_7)):
        with Locations(Location((0, 0, 0), (0, 0, 180))):
            Circle(SKETCH_28_R)
        with Locations(Location((0, 0, 0), (0, 0, 180))):
            Circle(SKETCH_28_R_2, mode=Mode.SUBTRACT)
    extrude(amount=EXTRUDE_15_DEPTH)


solid = part.part
